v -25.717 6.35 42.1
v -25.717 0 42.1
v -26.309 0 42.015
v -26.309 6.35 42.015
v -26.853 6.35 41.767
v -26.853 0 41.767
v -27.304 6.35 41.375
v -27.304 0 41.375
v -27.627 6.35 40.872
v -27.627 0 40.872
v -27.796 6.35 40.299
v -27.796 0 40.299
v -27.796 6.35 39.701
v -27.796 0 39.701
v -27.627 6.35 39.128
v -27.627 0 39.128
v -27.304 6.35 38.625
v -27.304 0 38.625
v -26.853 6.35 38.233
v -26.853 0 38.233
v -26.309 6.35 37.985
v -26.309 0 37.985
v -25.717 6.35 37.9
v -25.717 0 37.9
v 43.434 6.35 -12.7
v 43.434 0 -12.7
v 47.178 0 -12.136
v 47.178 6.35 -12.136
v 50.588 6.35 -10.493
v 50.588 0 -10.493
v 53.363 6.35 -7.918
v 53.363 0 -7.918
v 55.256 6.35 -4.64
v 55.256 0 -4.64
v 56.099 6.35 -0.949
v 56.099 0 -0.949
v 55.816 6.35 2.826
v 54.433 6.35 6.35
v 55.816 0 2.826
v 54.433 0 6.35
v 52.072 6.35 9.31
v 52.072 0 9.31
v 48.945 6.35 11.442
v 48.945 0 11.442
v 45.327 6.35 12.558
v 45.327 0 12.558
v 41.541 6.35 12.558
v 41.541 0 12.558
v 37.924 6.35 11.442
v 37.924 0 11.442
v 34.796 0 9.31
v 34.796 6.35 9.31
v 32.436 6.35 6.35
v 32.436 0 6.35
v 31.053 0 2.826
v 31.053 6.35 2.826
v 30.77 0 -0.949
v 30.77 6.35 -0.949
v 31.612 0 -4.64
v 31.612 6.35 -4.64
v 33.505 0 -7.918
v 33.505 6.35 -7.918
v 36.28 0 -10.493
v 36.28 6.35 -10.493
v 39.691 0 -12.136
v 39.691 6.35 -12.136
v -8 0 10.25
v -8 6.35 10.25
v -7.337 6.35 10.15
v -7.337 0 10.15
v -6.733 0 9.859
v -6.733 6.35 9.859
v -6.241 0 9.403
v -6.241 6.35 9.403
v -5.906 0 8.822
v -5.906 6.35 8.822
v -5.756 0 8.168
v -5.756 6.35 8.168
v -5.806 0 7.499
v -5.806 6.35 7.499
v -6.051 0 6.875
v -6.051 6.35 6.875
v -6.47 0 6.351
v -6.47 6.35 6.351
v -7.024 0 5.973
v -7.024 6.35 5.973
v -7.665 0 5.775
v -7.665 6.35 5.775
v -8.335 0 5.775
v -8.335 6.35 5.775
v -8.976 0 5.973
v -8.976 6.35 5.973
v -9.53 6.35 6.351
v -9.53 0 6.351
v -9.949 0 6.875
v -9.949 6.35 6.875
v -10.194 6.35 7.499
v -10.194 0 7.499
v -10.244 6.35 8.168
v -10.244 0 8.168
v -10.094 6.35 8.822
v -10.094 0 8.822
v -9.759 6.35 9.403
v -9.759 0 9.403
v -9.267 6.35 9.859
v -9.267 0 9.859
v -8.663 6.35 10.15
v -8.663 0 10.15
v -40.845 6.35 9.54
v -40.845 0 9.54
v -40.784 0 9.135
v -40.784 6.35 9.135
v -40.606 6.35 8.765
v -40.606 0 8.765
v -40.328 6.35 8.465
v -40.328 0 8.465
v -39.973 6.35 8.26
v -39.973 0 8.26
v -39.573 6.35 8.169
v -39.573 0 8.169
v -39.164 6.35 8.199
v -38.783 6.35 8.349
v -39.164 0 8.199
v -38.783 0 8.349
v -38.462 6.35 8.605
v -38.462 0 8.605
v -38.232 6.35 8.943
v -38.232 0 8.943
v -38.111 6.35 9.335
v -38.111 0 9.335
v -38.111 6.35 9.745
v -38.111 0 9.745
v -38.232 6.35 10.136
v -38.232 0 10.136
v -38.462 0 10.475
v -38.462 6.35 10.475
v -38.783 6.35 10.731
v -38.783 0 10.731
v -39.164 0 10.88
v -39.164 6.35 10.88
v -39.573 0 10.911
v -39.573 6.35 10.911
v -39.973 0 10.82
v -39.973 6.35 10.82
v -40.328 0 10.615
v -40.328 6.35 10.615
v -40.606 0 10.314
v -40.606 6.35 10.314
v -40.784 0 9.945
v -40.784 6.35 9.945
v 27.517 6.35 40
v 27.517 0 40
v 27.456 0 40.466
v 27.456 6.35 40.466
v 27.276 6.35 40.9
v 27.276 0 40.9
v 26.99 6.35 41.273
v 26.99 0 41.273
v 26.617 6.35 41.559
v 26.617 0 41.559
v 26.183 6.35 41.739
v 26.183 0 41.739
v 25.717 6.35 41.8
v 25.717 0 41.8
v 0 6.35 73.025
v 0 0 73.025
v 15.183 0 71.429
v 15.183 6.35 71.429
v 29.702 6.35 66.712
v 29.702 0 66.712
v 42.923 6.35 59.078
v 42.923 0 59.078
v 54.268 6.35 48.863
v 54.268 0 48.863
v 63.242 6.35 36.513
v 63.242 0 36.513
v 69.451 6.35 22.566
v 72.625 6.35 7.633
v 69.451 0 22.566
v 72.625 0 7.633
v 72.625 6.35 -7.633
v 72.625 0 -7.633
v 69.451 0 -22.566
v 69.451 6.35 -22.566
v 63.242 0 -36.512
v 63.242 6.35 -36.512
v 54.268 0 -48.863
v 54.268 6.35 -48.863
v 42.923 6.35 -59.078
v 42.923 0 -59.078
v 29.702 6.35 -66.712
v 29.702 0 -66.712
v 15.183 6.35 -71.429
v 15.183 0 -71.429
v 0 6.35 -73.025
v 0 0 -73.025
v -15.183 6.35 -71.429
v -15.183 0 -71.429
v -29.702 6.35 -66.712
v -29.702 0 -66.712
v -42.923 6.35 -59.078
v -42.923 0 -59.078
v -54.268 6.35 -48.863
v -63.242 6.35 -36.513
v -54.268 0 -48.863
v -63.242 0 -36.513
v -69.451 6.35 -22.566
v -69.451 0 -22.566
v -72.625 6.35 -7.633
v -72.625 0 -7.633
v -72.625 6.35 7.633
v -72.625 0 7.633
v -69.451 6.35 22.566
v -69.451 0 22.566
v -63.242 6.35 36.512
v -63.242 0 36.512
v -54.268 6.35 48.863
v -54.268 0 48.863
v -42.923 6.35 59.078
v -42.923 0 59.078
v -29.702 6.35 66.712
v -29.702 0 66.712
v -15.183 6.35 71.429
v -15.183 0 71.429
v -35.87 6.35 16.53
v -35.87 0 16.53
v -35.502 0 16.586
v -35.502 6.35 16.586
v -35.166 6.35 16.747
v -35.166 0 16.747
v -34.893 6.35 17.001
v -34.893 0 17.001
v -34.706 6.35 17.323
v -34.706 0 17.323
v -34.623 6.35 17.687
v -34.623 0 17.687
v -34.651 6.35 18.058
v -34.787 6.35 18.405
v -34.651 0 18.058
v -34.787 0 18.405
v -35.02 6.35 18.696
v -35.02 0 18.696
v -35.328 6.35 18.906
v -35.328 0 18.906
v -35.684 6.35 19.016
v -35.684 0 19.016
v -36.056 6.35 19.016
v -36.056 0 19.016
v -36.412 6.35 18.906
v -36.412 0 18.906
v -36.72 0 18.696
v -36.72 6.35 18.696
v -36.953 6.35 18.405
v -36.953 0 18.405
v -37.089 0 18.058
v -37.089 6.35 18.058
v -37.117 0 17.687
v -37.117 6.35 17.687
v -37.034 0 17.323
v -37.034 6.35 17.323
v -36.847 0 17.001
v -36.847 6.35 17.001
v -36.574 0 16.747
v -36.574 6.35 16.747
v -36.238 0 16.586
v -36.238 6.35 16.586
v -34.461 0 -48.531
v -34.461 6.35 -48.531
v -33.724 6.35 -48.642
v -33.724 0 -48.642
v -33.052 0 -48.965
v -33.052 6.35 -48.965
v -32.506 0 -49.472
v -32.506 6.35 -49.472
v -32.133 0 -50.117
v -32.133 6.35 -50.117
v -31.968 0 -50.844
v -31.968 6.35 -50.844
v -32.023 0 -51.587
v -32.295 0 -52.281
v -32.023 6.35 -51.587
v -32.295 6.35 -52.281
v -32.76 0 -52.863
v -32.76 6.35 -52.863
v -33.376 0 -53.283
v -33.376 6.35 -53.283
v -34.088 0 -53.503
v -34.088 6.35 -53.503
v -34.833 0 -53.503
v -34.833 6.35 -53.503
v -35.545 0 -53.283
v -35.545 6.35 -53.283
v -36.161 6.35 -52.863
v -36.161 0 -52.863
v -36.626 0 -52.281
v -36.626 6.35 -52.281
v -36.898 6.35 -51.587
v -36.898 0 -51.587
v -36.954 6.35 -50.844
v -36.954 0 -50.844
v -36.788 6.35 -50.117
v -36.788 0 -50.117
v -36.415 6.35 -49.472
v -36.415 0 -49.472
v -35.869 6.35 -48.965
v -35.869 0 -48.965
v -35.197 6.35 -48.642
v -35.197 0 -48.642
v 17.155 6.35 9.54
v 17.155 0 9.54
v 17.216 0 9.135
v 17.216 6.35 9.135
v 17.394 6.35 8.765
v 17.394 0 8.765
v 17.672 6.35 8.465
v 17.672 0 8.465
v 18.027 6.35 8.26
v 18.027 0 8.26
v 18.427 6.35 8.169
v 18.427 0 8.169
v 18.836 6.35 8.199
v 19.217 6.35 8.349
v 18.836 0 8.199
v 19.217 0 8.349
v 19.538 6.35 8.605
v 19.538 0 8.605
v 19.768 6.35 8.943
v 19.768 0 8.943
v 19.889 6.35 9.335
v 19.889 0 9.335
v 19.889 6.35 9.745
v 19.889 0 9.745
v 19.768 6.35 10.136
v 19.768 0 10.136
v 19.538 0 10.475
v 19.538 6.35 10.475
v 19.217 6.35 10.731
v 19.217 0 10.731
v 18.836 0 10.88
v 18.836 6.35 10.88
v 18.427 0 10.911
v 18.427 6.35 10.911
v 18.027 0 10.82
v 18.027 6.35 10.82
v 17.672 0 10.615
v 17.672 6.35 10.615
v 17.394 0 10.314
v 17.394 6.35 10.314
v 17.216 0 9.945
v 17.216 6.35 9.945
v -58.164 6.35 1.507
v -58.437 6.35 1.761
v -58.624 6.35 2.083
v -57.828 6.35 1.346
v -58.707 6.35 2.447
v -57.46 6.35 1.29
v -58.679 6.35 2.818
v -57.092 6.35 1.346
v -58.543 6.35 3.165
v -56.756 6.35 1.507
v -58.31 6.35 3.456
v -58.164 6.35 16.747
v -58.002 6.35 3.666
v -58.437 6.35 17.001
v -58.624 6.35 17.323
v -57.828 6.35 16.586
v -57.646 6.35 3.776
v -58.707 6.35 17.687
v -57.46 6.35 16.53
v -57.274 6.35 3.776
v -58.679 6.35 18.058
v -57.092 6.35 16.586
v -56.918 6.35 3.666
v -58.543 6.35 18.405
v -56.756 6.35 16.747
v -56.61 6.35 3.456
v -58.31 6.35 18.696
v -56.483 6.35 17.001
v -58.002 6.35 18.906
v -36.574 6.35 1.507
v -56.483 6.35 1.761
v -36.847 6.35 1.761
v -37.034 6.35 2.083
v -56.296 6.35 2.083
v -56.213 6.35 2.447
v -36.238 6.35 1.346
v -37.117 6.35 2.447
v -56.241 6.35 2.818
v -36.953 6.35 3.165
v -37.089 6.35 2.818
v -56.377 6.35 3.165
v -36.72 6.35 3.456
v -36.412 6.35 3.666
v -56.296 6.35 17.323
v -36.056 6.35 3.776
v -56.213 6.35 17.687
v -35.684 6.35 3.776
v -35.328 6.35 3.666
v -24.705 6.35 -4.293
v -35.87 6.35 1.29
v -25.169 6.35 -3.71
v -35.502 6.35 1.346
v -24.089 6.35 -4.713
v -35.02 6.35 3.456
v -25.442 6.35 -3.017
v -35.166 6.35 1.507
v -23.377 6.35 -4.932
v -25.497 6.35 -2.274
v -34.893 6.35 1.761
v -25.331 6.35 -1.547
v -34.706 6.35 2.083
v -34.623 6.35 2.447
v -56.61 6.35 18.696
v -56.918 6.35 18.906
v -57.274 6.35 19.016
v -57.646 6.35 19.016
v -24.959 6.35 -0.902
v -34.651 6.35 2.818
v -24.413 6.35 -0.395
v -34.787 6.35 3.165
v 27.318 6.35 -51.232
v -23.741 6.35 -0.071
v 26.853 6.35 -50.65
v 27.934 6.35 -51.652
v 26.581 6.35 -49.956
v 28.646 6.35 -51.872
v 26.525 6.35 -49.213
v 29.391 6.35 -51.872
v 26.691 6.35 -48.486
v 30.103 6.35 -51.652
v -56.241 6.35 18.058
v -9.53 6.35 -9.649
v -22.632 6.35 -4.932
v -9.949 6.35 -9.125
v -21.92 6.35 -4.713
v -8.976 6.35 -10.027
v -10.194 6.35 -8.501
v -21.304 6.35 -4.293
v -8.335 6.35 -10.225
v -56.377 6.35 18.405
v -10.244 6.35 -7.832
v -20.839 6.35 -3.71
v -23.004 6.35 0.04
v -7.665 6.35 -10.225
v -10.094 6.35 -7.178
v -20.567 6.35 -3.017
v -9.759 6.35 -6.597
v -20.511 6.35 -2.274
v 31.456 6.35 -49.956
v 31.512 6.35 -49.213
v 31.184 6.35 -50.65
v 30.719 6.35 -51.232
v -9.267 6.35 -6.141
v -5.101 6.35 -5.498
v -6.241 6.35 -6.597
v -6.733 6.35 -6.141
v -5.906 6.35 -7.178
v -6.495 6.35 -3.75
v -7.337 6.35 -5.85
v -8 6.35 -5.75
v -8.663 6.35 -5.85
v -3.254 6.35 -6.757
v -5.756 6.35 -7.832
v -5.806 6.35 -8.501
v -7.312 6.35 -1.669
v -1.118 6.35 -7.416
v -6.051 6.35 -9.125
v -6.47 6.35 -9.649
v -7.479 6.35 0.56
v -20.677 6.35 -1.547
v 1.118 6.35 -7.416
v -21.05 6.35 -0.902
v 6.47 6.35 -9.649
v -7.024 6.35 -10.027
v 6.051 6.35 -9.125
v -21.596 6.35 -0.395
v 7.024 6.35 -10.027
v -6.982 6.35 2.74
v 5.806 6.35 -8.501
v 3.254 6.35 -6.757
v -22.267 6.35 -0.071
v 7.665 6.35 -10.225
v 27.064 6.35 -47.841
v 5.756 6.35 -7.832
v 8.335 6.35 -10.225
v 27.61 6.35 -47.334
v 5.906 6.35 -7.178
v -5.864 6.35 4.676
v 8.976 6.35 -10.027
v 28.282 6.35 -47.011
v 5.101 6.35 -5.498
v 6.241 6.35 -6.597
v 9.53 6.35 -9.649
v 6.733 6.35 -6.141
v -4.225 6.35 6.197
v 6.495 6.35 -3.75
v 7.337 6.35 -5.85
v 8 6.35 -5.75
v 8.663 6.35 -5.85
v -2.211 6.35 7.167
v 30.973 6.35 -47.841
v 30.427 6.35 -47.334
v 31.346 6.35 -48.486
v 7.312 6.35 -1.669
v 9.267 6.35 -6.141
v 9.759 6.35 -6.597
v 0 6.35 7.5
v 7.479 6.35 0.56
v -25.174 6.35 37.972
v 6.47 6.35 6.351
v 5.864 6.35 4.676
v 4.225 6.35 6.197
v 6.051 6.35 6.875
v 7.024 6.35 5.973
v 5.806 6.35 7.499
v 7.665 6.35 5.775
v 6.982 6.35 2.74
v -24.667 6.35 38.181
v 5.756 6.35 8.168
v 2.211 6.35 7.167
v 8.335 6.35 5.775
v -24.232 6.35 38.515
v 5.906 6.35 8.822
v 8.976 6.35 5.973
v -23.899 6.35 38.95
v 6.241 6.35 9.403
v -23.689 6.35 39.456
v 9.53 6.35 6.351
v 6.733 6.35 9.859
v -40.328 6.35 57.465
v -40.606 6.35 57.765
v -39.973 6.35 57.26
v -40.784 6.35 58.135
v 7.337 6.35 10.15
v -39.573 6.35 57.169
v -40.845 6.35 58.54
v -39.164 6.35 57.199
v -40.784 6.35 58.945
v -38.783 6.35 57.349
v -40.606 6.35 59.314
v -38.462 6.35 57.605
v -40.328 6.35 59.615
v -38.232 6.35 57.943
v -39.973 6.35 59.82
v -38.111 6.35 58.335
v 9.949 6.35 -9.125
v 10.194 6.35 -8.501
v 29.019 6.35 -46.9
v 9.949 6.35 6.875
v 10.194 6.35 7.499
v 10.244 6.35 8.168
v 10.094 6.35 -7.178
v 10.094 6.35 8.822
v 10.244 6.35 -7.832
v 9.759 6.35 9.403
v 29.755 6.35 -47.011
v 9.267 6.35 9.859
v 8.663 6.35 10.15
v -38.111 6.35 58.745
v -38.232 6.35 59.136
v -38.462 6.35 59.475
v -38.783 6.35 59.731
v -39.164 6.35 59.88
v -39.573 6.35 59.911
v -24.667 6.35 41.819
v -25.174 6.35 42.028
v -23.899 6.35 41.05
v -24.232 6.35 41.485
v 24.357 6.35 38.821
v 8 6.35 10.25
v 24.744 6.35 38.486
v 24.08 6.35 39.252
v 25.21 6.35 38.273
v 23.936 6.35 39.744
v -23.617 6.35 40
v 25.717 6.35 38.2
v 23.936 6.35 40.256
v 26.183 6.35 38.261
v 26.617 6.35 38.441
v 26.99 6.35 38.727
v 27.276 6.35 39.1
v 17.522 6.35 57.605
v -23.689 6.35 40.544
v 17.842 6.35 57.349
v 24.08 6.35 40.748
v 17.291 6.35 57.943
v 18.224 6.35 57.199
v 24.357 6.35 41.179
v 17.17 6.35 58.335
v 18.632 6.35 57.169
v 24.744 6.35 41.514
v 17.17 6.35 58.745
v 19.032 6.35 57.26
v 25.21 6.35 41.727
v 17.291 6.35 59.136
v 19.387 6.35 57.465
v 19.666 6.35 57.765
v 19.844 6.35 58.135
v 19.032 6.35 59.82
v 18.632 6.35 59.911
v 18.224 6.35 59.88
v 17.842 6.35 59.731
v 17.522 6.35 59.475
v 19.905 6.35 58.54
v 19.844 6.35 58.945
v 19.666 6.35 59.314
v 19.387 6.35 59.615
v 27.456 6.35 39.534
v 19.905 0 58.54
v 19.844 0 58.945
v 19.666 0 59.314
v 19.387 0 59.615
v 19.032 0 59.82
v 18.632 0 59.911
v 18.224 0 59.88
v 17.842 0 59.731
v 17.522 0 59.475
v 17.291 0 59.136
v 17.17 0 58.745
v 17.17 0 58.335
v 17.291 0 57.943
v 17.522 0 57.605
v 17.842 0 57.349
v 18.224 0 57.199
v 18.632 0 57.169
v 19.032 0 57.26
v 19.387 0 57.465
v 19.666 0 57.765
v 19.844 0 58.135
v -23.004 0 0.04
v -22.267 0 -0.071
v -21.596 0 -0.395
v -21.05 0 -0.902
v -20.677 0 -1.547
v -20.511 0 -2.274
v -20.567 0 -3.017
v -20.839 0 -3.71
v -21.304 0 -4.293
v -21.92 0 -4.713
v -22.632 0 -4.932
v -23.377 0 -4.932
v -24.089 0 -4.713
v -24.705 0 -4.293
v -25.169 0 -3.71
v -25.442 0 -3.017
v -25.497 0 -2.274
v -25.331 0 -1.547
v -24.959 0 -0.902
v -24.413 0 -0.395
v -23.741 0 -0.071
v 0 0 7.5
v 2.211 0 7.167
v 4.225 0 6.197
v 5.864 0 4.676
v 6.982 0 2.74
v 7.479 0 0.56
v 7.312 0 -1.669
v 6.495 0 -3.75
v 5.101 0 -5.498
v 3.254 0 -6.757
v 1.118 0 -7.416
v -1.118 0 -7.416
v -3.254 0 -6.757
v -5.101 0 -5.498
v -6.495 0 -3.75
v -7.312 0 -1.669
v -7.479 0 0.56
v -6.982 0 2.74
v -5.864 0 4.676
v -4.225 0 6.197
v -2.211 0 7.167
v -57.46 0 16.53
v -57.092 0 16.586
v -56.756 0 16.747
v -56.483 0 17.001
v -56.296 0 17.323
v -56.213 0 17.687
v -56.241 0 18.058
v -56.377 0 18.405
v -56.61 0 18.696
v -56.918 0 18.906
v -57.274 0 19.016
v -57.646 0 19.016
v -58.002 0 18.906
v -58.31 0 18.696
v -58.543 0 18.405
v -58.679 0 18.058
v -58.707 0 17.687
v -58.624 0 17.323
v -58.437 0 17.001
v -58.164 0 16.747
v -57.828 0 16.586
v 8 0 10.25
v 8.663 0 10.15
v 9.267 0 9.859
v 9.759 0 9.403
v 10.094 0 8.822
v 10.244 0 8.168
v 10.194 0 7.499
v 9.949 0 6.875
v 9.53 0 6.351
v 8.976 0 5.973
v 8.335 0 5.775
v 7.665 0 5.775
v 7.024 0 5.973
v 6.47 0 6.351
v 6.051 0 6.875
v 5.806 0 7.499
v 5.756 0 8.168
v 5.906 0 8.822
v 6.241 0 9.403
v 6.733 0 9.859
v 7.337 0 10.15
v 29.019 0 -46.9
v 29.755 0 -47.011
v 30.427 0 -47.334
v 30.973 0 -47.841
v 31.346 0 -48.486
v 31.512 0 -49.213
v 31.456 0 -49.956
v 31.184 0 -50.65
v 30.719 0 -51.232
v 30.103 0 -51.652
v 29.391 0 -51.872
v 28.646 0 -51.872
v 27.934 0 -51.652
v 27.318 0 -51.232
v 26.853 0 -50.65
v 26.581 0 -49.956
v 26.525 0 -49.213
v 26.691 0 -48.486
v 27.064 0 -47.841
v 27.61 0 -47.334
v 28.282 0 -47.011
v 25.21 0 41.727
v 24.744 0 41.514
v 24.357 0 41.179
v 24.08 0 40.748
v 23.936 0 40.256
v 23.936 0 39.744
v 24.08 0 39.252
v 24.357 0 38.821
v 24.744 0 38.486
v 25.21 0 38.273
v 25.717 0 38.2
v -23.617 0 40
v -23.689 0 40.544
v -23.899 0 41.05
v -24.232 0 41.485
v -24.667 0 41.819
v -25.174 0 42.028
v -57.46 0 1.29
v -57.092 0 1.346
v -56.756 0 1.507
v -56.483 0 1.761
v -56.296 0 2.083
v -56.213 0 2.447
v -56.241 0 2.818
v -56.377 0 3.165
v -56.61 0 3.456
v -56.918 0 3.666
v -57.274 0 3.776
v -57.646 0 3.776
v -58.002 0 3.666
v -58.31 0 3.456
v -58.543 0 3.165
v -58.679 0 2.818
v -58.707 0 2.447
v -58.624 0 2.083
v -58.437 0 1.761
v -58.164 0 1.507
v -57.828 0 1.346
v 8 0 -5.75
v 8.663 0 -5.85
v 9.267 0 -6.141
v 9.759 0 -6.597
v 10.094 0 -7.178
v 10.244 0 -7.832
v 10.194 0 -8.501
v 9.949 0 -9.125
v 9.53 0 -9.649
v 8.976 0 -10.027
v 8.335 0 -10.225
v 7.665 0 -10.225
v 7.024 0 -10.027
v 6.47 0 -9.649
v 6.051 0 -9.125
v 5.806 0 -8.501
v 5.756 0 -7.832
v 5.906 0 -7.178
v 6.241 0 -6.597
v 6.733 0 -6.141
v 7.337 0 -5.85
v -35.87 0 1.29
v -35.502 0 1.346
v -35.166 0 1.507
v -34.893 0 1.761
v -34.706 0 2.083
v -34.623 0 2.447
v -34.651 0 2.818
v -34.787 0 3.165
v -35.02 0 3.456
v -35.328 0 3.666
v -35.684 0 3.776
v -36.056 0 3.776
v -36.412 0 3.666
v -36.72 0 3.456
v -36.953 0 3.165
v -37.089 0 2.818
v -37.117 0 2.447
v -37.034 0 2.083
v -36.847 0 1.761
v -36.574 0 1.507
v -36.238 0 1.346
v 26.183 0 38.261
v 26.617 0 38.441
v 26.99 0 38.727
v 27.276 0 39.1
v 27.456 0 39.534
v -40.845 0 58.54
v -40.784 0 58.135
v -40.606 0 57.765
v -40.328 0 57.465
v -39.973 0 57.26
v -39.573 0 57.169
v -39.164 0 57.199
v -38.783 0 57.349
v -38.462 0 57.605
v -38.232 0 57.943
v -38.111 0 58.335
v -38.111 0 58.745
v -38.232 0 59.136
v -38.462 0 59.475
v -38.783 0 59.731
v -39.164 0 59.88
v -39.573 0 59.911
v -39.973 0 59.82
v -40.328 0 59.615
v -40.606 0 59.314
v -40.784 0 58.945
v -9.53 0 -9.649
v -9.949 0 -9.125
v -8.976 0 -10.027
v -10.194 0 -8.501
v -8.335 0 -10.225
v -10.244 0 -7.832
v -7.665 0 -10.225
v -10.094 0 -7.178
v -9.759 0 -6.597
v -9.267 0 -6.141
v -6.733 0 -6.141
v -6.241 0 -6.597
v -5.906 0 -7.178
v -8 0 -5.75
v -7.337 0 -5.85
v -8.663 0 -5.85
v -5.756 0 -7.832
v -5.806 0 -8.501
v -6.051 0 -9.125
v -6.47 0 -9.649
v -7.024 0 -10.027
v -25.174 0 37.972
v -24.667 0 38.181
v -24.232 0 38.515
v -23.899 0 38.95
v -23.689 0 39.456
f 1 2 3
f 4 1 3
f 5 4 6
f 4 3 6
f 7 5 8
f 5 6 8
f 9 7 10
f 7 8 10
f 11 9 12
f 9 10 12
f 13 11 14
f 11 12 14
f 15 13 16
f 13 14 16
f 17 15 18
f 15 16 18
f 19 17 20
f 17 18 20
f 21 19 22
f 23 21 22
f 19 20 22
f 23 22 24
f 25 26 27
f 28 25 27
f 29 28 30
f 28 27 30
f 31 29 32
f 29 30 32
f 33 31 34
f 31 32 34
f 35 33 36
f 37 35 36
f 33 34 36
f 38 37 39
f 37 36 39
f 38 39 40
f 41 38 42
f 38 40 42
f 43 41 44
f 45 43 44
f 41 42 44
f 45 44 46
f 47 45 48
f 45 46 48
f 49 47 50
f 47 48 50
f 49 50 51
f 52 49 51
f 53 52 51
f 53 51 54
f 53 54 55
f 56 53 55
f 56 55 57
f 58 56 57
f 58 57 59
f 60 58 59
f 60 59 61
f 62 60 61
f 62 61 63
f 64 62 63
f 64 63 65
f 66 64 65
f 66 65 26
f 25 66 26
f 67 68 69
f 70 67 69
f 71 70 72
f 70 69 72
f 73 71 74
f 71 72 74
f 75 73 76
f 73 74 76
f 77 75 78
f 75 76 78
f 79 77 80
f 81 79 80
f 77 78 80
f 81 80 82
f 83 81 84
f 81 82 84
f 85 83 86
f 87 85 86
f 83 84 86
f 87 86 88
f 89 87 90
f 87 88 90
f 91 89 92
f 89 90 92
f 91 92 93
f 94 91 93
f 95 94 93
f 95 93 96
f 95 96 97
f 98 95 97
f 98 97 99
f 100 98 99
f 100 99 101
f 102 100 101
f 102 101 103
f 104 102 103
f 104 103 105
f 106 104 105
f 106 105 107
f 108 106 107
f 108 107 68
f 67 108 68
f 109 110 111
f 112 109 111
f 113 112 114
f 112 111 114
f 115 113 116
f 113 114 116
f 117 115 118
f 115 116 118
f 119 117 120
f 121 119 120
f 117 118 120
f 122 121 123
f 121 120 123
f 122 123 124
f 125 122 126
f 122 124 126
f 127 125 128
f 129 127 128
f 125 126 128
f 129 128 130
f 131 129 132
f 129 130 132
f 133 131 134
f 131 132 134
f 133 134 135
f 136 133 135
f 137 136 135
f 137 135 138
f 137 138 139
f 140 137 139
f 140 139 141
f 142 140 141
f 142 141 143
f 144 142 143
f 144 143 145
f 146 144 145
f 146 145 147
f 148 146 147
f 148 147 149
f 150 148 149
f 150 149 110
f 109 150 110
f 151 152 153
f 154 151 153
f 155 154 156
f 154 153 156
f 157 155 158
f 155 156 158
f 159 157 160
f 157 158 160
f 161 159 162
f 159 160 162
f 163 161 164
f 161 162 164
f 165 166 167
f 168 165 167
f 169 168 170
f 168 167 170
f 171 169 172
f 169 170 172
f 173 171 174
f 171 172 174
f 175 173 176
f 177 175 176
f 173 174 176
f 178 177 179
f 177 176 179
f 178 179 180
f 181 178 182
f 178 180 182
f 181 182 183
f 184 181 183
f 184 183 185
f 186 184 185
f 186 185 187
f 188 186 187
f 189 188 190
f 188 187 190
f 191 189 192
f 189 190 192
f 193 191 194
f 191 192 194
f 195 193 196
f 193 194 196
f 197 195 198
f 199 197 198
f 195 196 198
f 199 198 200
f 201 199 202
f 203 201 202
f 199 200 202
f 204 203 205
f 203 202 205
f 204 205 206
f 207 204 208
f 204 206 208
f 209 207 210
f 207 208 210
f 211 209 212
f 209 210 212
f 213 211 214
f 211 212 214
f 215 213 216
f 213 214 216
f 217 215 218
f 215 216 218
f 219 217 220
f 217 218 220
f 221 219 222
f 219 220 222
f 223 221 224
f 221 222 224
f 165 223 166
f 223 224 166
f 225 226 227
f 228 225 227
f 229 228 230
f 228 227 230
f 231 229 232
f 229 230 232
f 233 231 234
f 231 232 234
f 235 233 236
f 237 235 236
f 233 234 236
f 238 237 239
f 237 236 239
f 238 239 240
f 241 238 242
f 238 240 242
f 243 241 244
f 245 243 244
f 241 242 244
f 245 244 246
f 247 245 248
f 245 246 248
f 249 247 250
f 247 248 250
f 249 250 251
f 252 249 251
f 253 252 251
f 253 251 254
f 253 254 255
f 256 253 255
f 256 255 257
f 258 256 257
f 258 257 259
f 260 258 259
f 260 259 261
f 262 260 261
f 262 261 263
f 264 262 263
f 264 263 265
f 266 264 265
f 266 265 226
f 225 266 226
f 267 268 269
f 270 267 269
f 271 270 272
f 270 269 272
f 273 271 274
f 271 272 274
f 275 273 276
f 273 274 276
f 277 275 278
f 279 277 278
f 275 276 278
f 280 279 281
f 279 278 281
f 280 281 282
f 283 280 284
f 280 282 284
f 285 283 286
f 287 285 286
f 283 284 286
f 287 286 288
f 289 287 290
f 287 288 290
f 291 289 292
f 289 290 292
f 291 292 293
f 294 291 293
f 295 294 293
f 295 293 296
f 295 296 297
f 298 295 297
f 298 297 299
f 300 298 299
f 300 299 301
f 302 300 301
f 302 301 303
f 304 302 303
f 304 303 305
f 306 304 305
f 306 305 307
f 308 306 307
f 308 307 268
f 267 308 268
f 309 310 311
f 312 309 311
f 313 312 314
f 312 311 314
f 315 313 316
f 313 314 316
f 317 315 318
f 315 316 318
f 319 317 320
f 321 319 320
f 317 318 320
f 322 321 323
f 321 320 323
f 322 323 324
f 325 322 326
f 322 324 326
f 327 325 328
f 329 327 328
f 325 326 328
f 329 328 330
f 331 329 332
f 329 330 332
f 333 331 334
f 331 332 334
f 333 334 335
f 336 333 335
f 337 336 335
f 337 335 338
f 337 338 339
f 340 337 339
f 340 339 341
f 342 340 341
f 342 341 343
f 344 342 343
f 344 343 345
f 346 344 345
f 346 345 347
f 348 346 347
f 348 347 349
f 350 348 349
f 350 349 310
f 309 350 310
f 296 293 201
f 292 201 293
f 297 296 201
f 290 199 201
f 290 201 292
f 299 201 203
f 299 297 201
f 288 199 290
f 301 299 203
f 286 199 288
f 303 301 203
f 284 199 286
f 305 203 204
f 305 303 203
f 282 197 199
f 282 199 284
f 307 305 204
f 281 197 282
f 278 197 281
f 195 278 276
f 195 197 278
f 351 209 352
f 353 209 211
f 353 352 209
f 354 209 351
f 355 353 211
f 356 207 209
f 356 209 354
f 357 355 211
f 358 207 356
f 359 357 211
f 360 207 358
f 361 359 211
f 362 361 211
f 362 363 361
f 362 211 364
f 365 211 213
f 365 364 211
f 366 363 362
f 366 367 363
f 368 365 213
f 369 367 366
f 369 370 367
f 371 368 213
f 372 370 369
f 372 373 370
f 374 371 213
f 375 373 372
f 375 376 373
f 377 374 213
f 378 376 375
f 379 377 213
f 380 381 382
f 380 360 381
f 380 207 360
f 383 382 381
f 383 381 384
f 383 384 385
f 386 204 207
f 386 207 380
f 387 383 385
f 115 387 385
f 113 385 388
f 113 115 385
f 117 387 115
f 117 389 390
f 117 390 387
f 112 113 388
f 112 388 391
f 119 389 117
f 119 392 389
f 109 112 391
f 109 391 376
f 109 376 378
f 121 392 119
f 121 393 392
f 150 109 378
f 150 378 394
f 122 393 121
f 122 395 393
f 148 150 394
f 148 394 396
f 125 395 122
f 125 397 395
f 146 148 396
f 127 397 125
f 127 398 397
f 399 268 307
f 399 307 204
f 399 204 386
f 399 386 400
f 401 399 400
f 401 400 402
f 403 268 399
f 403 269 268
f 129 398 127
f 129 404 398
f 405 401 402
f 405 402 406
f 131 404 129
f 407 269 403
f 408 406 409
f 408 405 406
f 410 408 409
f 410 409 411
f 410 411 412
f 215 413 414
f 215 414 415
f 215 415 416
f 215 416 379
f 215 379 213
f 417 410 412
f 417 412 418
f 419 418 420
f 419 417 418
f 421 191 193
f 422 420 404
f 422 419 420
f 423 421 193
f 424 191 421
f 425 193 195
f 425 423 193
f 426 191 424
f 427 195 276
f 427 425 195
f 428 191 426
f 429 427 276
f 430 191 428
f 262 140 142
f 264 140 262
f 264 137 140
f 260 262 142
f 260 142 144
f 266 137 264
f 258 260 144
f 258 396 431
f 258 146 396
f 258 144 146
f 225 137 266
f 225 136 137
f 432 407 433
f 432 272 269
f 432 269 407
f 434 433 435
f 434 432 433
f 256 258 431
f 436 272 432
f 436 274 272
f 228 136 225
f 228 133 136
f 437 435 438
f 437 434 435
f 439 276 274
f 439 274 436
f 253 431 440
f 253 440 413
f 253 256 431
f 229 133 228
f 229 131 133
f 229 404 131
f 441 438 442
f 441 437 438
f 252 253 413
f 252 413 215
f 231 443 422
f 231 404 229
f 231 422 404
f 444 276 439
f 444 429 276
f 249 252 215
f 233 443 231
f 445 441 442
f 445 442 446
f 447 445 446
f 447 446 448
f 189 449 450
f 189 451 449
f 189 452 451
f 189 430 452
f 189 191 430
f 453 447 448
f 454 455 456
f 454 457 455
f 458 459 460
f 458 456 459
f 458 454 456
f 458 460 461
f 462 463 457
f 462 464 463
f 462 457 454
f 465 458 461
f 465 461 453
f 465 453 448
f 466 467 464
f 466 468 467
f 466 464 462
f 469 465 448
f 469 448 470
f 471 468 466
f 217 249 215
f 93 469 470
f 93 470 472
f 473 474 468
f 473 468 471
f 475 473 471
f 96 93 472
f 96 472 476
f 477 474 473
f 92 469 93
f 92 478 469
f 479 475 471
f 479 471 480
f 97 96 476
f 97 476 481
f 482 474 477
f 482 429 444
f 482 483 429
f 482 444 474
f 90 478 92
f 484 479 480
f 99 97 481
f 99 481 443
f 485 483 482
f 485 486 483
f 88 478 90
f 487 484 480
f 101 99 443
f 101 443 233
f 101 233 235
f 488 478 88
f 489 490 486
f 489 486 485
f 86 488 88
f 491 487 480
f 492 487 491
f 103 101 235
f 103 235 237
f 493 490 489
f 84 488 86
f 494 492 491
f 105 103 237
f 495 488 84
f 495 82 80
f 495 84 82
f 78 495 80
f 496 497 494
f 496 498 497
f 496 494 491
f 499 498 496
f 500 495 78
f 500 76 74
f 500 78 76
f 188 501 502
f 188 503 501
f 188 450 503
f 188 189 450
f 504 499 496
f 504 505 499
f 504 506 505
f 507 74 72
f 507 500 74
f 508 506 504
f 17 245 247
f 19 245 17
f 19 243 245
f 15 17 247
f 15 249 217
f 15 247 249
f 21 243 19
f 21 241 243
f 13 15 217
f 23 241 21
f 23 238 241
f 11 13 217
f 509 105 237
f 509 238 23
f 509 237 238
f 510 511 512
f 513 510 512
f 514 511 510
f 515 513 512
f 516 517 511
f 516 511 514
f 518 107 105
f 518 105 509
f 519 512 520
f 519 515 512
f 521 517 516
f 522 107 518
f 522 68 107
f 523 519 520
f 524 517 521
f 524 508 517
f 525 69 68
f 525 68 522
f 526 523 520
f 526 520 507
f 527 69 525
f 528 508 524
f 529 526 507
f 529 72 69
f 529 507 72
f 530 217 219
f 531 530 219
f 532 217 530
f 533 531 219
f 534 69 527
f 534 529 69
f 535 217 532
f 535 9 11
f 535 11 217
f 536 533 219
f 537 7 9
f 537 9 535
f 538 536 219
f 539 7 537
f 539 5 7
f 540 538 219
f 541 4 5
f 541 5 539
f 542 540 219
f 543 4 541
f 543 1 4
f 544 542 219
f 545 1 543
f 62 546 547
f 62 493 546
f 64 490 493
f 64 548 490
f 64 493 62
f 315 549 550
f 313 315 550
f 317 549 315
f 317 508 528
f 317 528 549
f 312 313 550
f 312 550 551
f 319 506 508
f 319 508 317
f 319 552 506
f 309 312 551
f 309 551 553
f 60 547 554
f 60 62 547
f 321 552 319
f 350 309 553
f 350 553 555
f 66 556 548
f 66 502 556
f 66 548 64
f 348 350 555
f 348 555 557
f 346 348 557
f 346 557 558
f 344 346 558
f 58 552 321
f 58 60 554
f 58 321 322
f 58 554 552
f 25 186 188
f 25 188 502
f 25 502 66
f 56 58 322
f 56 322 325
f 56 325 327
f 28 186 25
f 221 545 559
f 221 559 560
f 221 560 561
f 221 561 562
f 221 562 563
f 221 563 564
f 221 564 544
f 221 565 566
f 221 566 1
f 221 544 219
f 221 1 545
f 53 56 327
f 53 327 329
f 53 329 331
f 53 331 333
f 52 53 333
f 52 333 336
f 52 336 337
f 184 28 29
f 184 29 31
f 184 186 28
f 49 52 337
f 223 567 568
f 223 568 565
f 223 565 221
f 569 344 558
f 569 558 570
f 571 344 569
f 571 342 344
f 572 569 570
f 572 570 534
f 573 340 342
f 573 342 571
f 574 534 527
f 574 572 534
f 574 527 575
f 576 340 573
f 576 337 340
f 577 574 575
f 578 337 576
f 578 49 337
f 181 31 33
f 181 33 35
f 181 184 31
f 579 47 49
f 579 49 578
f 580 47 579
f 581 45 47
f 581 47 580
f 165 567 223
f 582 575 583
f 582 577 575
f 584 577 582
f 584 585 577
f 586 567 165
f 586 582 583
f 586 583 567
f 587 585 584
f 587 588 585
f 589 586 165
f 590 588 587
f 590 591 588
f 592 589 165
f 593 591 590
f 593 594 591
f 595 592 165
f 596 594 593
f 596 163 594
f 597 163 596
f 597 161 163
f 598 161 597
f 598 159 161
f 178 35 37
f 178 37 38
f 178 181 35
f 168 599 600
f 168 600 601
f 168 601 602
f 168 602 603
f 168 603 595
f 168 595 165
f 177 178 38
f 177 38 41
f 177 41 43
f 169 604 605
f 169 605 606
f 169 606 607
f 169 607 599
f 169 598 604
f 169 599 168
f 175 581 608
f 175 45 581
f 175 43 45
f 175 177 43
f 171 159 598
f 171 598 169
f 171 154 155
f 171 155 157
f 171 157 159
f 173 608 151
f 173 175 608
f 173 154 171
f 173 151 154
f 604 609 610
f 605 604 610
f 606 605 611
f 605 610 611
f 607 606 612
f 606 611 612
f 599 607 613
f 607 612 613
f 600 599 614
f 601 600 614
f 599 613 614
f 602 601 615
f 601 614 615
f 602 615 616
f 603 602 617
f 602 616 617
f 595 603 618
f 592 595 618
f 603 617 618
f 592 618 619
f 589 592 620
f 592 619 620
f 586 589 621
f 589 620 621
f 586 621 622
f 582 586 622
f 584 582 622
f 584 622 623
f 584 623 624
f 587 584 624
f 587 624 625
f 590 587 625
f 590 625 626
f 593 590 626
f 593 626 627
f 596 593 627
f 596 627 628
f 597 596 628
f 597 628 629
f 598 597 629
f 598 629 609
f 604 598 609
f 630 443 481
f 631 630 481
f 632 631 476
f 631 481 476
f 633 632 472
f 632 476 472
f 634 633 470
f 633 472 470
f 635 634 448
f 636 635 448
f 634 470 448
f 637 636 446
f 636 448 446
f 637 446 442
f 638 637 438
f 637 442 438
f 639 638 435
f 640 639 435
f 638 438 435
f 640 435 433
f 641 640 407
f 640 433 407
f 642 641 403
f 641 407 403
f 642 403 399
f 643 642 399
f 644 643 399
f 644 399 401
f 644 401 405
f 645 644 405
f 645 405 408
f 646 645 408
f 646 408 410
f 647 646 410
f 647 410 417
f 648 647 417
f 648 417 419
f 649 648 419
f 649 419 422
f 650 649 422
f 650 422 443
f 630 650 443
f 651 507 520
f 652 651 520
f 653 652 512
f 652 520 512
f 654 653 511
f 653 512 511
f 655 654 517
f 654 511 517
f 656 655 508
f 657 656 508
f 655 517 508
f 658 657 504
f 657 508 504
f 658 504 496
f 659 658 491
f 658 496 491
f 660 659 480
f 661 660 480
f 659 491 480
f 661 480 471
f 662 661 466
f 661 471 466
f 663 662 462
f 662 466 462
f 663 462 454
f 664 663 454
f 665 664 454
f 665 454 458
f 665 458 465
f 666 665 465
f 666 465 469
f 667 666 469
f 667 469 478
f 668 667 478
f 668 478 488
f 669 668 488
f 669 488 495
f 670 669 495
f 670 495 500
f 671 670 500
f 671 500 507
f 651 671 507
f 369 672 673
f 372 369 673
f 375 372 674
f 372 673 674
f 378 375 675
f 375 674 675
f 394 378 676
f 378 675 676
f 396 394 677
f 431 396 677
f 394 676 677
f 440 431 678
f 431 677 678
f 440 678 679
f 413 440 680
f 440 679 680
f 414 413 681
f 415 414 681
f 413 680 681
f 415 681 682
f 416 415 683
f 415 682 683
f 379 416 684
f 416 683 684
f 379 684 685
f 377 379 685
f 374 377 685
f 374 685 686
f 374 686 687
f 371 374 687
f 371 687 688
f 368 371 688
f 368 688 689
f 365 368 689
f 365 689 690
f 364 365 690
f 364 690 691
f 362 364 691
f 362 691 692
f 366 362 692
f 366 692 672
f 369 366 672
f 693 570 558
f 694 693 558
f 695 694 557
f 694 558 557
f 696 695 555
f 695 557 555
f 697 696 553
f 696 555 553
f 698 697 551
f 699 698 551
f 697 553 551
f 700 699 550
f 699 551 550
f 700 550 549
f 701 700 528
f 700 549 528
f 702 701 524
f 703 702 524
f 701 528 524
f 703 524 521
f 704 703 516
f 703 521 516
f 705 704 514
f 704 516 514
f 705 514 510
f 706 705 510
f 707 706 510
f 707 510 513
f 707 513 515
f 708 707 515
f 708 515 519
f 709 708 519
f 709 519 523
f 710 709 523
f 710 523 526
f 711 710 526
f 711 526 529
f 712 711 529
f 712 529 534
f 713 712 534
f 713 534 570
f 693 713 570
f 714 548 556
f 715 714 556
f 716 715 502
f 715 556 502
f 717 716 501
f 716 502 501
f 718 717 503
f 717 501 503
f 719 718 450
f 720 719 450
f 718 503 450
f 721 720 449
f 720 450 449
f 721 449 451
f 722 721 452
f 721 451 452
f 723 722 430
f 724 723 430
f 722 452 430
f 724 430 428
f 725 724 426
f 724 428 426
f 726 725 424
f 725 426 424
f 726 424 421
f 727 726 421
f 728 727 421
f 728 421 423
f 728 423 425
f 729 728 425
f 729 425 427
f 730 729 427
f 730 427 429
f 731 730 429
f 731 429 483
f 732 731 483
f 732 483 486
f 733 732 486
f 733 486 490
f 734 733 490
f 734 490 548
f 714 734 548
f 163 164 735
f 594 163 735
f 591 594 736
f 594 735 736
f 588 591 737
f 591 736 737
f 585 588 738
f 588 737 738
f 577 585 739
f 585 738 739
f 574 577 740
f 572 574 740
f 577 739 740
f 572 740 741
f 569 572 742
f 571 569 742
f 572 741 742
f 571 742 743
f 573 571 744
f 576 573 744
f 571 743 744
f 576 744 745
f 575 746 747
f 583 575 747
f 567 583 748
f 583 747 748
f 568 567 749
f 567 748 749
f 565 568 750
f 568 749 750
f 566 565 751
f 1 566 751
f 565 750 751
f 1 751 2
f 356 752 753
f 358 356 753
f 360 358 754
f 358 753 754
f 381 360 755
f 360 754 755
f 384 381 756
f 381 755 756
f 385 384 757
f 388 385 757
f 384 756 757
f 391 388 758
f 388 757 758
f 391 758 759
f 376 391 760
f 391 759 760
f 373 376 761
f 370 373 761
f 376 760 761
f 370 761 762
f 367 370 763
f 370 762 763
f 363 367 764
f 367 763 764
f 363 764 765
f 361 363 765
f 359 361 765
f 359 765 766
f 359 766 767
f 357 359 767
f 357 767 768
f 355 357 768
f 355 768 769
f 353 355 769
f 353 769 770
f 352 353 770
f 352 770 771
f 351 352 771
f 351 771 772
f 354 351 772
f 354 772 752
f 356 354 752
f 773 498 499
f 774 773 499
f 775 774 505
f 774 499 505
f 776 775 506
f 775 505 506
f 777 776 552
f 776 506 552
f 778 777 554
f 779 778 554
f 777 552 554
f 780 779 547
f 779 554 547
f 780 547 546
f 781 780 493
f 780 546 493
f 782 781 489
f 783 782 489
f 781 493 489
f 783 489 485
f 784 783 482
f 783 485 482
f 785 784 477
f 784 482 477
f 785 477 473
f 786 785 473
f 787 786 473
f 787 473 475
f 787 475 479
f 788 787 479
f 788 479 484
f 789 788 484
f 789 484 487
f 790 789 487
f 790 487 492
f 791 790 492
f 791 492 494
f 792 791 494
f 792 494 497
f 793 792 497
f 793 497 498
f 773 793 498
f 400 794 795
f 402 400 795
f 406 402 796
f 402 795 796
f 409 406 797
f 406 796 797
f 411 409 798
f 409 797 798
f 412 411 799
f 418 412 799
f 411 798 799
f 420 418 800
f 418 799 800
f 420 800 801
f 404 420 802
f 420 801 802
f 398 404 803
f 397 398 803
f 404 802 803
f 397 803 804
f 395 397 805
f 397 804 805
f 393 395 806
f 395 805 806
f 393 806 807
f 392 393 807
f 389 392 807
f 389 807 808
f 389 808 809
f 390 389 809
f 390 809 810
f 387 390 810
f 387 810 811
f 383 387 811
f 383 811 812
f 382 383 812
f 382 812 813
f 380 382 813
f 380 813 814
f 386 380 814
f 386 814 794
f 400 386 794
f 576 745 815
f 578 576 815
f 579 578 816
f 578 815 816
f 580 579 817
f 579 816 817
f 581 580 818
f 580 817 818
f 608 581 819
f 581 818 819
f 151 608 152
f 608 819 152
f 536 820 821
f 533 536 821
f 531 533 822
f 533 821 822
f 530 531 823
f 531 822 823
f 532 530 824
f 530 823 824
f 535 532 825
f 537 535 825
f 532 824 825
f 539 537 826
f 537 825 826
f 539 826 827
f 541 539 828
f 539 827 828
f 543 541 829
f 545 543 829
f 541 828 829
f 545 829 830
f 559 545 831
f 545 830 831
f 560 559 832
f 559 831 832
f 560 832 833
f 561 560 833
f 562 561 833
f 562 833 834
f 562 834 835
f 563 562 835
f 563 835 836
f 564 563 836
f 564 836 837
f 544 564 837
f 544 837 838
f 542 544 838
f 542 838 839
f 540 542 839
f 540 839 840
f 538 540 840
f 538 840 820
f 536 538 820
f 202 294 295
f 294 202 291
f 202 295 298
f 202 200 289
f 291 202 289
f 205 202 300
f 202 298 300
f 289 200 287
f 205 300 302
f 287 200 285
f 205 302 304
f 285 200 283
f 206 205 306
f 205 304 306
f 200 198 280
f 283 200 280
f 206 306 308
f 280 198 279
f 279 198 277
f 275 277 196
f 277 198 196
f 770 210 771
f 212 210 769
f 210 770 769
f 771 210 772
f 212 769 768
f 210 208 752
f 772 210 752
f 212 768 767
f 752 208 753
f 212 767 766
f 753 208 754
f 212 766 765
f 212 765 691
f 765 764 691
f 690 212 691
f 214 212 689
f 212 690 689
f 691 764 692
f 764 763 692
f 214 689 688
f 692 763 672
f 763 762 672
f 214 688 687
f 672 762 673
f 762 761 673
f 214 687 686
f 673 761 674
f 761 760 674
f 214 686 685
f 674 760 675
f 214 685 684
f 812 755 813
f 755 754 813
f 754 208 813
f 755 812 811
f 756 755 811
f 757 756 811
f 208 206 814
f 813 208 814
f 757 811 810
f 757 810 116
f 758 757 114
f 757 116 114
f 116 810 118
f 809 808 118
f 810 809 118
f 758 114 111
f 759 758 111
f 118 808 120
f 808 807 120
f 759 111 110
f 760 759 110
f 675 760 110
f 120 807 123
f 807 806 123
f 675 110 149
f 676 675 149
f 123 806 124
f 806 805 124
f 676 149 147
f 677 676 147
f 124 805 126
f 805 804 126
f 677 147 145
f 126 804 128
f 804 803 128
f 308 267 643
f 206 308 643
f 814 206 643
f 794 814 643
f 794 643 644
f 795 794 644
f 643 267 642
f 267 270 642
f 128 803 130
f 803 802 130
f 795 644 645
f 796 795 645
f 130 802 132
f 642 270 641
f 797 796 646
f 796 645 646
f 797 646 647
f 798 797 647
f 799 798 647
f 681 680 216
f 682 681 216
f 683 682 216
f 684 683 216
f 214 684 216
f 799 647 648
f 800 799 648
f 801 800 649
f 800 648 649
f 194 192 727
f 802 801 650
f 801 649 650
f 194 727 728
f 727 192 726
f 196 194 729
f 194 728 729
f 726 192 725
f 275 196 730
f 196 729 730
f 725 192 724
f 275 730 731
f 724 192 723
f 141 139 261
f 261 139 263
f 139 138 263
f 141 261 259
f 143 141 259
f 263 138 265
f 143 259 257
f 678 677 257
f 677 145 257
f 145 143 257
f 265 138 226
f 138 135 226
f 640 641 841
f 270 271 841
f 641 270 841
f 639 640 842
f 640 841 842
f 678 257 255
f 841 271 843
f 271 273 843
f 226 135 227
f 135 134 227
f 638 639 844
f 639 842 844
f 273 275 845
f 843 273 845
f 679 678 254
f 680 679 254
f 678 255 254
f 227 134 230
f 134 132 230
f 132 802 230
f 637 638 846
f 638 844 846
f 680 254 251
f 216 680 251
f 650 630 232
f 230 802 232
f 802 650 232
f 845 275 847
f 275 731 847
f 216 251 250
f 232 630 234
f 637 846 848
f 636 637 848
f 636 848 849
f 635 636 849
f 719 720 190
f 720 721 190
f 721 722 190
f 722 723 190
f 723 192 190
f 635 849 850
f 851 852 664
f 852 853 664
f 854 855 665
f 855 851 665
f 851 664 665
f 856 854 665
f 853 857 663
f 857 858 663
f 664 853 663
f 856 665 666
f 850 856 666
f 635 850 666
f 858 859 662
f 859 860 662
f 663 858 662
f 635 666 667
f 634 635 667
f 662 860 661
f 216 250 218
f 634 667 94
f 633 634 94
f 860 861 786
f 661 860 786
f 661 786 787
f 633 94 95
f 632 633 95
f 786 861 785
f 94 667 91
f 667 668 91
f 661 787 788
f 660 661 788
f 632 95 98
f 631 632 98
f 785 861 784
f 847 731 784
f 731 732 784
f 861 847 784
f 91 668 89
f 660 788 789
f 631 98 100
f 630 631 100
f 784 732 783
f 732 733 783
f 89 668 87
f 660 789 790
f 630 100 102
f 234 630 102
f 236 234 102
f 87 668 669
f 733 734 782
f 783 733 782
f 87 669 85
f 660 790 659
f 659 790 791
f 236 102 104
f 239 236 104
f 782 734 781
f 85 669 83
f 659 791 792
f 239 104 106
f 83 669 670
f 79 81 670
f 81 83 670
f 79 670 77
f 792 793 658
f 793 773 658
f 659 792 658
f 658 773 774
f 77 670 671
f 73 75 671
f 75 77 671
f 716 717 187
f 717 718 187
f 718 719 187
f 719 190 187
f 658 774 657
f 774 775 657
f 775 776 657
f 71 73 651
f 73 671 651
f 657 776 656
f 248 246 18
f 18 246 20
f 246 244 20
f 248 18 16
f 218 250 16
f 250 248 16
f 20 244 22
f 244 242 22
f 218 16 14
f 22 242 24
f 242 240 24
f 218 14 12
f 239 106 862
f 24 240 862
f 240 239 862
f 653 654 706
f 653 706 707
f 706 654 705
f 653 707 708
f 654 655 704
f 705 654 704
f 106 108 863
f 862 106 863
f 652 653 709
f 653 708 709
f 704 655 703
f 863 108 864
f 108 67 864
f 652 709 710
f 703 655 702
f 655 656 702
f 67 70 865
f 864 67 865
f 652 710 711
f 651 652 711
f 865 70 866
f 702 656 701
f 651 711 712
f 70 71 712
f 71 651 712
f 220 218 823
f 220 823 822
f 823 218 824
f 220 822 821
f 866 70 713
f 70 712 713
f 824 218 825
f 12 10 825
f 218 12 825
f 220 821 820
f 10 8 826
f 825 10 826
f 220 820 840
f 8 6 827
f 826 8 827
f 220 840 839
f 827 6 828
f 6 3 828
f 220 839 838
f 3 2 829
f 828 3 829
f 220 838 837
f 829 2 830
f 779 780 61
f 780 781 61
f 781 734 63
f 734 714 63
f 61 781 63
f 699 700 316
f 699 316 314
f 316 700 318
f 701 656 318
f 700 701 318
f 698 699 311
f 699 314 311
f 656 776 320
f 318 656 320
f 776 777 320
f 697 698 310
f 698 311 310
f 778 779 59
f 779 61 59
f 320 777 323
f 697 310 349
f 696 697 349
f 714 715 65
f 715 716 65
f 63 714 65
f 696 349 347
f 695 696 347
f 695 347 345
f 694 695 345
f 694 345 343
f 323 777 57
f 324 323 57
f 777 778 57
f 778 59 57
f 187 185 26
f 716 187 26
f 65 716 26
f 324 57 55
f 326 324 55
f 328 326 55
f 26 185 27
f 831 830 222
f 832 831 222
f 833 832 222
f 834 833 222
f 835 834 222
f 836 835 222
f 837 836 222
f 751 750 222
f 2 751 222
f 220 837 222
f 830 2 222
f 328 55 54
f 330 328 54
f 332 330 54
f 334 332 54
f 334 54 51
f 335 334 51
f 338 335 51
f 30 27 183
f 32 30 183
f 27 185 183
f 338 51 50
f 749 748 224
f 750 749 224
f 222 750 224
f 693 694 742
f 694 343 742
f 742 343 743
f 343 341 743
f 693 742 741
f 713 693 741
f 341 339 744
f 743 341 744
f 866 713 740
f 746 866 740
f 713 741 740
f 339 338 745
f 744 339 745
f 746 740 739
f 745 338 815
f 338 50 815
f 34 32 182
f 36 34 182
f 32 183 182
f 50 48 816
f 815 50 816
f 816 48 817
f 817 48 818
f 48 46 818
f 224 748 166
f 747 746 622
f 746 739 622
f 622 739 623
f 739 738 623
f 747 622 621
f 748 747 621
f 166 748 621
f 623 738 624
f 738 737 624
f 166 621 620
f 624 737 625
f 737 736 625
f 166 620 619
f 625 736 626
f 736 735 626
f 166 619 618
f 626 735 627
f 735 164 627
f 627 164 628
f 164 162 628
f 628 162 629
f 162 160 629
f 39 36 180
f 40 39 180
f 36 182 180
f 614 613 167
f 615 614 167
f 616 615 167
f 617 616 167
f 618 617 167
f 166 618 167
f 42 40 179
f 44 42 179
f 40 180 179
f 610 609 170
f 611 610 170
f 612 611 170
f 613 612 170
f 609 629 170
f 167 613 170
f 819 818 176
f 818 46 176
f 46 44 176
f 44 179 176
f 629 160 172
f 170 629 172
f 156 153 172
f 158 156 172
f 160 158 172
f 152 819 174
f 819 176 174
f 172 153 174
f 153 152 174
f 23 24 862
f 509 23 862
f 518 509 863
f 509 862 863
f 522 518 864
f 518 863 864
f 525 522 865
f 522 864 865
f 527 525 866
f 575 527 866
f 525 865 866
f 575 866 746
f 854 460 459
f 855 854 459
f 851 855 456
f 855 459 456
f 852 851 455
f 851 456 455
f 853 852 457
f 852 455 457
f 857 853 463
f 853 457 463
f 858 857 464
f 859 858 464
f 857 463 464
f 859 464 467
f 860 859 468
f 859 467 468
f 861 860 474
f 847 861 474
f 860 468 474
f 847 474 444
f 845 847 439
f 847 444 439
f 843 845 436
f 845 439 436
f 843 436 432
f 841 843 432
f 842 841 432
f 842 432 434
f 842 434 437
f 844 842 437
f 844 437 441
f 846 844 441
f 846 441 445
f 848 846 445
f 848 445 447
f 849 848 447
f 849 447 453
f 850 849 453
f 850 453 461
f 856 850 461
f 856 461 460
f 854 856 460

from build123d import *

# Parameters (mm, degrees)
SKETCH1_R           = 73.025
BOSS_EXTRUDE1_DEPTH = 6.35
SKETCH2_R           = 7.5
CUT_EXTRUDE1_DEPTH  = 104.467984179
SKETCH3_R           = 2.25
CUT_EXTRUDE2_DEPTH  = 104.467984179
SKETCH4_R           = 12.7
CUT_EXTRUDE3_DEPTH  = 104.467984179
SKETCH5_R           = 1.25
CUT_EXTRUDE4_DEPTH  = 104.467984179
SKETCH6_R           = 2.5
SKETCH6_R_2         = 2.2225
CUT_EXTRUDE5_DEPTH  = 104.467984179


with BuildPart() as part:
    # Sketch1 → Boss-Extrude1 (new body)
    with BuildSketch(Plane(origin=(0, 0, 0), x_dir=(1, 0, 0), z_dir=(0, 1, 0))):
        with Locations(Location((0, 0, 0), (0, 0, 270))):
            Circle(SKETCH1_R)
    extrude(amount=BOSS_EXTRUDE1_DEPTH)

    # Sketch2 → Cut-Extrude1 (cut, through all)
    with BuildSketch(Plane(origin=(0, 6.35, 0), x_dir=(1, 0, 0), z_dir=(0, 1, 0))):
        with Locations(Location((0, 0, 0), (0, 0, 270))):
            Circle(SKETCH2_R)
    extrude(amount=-CUT_EXTRUDE1_DEPTH, mode=Mode.SUBTRACT)

    # Sketch3 → Cut-Extrude2 (cut, through all)
    with BuildSketch(Plane(origin=(0, 6.35, 0), x_dir=(1, 0, 0), z_dir=(0, 1, 0))):
        with Locations(Location((-8, 8, 0), (0, 0, 270))):
            Circle(SKETCH3_R)
        with Locations(Location((8, 8, 0), (0, 0, 270))):
            Circle(SKETCH3_R)
        with Locations(Location((8, -8, 0), (0, 0, 270))):
            Circle(SKETCH3_R)
        with Locations(Location((-8, -8, 0), (0, 0, 270))):
            Circle(SKETCH3_R)
    extrude(amount=-CUT_EXTRUDE2_DEPTH, mode=Mode.SUBTRACT)

    # Sketch4 → Cut-Extrude3 (cut, through all)
    with BuildSketch(Plane.XZ):
        with Locations(Location((43.43418184, 0, 0), (0, 0, 270))):
            Circle(SKETCH4_R)
    extrude(amount=-CUT_EXTRUDE3_DEPTH, mode=Mode.SUBTRACT)

    # Sketch5 → Cut-Extrude4 (cut, through all)
    with BuildSketch(Plane.XZ):
        with BuildLine():
            ThreePointArc((-25.717186912, 42.1), (-27.817186912, 40), (-25.717186912, 37.9))
            ThreePointArc((-25.717186912, 37.9), (-24.232262671, 38.51507576), (-23.617186912, 40))
            ThreePointArc((-23.617186912, 40), (-24.232262671, 41.48492424), (-25.717186912, 42.1))
        make_face()
        with Locations(Location((-57.46, 17.78, 0), (0, 0, 270))):
            Circle(SKETCH5_R)
        with BuildLine():
            ThreePointArc((-38.095362557, 9.539806393), (-39.470362557, 10.914806393), (-40.845362557, 9.539806393))
            ThreePointArc((-40.845362557, 9.539806393), (-39.470362557, 8.164806393), (-38.095362557, 9.539806393))
        make_face()
        with Locations(Location((-35.87, 2.54, 0), (0, 0, 270))):
            Circle(SKETCH5_R)
        with Locations(Location((-57.46, 2.54, 0), (0, 0, 270))):
            Circle(SKETCH5_R)
        with BuildLine():
            ThreePointArc((-38.095362557, 58.539806393), (-39.470362557, 59.914806393), (-40.845362557, 58.539806393))
            ThreePointArc((-40.845362557, 58.539806393), (-39.470362557, 57.164806393), (-38.095362557, 58.539806393))
        make_face()
        with BuildLine():
            ThreePointArc((17.154637443, 58.539806393), (18.529637443, 57.164806393), (19.904637443, 58.539806393))
            ThreePointArc((19.904637443, 58.539806393), (18.529637443, 59.914806393), (17.154637443, 58.539806393))
        make_face()
        with BuildLine():
            ThreePointArc((25.717186912, 41.8), (23.917186912, 40), (25.717186912, 38.2))
            ThreePointArc((25.717186912, 38.2), (26.989979118, 38.727207794), (27.517186912, 40))
            ThreePointArc((27.517186912, 40), (26.989979118, 41.272792206), (25.717186912, 41.8))
        make_face()
        with BuildLine():
            ThreePointArc((19.904637443, 9.539806393), (18.529637443, 10.914806393), (17.154637443, 9.539806393))
            ThreePointArc((17.154637443, 9.539806393), (18.529637443, 8.164806393), (19.904637443, 9.539806393))
        make_face()
        with Locations(Location((-35.87, 17.78, 0), (0, 0, 270))):
            Circle(SKETCH5_R)
    extrude(amount=-CUT_EXTRUDE4_DEPTH, mode=Mode.SUBTRACT)

    # Sketch6 → Cut-Extrude5 (cut, through all)
    # profile 1 of 6: a face of its own
    with BuildSketch(Plane(origin=(0, 6.35, 0), x_dir=(1, 0, 0), z_dir=(0, 1, 0))):
        with Locations(Location((-34.460546587, 51.030675215, 0), (0, 0, 270))):
            Circle(SKETCH6_R)
        with Locations((-34.460546587, 51.030675215)):
            Circle(SKETCH6_R_2, mode=Mode.SUBTRACT)
    # profile 2 of 6: a face of its own
    with BuildSketch(Plane(origin=(0, 6.35, 0), x_dir=(1, 0, 0), z_dir=(0, 1, 0))):
        with Locations((-34.460546587, 51.030675215)):
            Circle(SKETCH6_R_2)
    # profile 3 of 6: a face of its own
    with BuildSketch(Plane(origin=(0, 6.35, 0), x_dir=(1, 0, 0), z_dir=(0, 1, 0))):
        with Locations(Location((29.018504419, 49.399698988, 0), (0, 0, 270))):
            Circle(SKETCH6_R)
        with Locations((29.018504419, 49.399698988)):
            Circle(SKETCH6_R_2, mode=Mode.SUBTRACT)
    # profile 4 of 6: a face of its own
    with BuildSketch(Plane(origin=(0, 6.35, 0), x_dir=(1, 0, 0), z_dir=(0, 1, 0))):
        with Locations((29.018504419, 49.399698988)):
            Circle(SKETCH6_R_2)
    # profile 5 of 6: a face of its own
    with BuildSketch(Plane(origin=(0, 6.35, 0), x_dir=(1, 0, 0), z_dir=(0, 1, 0))):
        with Locations(Location((-23.004278318, 2.460401205, 0), (0, 0, 270))):
            Circle(SKETCH6_R)
        with Locations((-23.004278318, 2.460401205)):
            Circle(SKETCH6_R_2, mode=Mode.SUBTRACT)
    # profile 6 of 6: a face of its own
    with BuildSketch(Plane(origin=(0, 6.35, 0), x_dir=(1, 0, 0), z_dir=(0, 1, 0))):
        with Locations((-23.004278318, 2.460401205)):
            Circle(SKETCH6_R_2)
    extrude(amount=-CUT_EXTRUDE5_DEPTH, mode=Mode.SUBTRACT)


solid = part.part
